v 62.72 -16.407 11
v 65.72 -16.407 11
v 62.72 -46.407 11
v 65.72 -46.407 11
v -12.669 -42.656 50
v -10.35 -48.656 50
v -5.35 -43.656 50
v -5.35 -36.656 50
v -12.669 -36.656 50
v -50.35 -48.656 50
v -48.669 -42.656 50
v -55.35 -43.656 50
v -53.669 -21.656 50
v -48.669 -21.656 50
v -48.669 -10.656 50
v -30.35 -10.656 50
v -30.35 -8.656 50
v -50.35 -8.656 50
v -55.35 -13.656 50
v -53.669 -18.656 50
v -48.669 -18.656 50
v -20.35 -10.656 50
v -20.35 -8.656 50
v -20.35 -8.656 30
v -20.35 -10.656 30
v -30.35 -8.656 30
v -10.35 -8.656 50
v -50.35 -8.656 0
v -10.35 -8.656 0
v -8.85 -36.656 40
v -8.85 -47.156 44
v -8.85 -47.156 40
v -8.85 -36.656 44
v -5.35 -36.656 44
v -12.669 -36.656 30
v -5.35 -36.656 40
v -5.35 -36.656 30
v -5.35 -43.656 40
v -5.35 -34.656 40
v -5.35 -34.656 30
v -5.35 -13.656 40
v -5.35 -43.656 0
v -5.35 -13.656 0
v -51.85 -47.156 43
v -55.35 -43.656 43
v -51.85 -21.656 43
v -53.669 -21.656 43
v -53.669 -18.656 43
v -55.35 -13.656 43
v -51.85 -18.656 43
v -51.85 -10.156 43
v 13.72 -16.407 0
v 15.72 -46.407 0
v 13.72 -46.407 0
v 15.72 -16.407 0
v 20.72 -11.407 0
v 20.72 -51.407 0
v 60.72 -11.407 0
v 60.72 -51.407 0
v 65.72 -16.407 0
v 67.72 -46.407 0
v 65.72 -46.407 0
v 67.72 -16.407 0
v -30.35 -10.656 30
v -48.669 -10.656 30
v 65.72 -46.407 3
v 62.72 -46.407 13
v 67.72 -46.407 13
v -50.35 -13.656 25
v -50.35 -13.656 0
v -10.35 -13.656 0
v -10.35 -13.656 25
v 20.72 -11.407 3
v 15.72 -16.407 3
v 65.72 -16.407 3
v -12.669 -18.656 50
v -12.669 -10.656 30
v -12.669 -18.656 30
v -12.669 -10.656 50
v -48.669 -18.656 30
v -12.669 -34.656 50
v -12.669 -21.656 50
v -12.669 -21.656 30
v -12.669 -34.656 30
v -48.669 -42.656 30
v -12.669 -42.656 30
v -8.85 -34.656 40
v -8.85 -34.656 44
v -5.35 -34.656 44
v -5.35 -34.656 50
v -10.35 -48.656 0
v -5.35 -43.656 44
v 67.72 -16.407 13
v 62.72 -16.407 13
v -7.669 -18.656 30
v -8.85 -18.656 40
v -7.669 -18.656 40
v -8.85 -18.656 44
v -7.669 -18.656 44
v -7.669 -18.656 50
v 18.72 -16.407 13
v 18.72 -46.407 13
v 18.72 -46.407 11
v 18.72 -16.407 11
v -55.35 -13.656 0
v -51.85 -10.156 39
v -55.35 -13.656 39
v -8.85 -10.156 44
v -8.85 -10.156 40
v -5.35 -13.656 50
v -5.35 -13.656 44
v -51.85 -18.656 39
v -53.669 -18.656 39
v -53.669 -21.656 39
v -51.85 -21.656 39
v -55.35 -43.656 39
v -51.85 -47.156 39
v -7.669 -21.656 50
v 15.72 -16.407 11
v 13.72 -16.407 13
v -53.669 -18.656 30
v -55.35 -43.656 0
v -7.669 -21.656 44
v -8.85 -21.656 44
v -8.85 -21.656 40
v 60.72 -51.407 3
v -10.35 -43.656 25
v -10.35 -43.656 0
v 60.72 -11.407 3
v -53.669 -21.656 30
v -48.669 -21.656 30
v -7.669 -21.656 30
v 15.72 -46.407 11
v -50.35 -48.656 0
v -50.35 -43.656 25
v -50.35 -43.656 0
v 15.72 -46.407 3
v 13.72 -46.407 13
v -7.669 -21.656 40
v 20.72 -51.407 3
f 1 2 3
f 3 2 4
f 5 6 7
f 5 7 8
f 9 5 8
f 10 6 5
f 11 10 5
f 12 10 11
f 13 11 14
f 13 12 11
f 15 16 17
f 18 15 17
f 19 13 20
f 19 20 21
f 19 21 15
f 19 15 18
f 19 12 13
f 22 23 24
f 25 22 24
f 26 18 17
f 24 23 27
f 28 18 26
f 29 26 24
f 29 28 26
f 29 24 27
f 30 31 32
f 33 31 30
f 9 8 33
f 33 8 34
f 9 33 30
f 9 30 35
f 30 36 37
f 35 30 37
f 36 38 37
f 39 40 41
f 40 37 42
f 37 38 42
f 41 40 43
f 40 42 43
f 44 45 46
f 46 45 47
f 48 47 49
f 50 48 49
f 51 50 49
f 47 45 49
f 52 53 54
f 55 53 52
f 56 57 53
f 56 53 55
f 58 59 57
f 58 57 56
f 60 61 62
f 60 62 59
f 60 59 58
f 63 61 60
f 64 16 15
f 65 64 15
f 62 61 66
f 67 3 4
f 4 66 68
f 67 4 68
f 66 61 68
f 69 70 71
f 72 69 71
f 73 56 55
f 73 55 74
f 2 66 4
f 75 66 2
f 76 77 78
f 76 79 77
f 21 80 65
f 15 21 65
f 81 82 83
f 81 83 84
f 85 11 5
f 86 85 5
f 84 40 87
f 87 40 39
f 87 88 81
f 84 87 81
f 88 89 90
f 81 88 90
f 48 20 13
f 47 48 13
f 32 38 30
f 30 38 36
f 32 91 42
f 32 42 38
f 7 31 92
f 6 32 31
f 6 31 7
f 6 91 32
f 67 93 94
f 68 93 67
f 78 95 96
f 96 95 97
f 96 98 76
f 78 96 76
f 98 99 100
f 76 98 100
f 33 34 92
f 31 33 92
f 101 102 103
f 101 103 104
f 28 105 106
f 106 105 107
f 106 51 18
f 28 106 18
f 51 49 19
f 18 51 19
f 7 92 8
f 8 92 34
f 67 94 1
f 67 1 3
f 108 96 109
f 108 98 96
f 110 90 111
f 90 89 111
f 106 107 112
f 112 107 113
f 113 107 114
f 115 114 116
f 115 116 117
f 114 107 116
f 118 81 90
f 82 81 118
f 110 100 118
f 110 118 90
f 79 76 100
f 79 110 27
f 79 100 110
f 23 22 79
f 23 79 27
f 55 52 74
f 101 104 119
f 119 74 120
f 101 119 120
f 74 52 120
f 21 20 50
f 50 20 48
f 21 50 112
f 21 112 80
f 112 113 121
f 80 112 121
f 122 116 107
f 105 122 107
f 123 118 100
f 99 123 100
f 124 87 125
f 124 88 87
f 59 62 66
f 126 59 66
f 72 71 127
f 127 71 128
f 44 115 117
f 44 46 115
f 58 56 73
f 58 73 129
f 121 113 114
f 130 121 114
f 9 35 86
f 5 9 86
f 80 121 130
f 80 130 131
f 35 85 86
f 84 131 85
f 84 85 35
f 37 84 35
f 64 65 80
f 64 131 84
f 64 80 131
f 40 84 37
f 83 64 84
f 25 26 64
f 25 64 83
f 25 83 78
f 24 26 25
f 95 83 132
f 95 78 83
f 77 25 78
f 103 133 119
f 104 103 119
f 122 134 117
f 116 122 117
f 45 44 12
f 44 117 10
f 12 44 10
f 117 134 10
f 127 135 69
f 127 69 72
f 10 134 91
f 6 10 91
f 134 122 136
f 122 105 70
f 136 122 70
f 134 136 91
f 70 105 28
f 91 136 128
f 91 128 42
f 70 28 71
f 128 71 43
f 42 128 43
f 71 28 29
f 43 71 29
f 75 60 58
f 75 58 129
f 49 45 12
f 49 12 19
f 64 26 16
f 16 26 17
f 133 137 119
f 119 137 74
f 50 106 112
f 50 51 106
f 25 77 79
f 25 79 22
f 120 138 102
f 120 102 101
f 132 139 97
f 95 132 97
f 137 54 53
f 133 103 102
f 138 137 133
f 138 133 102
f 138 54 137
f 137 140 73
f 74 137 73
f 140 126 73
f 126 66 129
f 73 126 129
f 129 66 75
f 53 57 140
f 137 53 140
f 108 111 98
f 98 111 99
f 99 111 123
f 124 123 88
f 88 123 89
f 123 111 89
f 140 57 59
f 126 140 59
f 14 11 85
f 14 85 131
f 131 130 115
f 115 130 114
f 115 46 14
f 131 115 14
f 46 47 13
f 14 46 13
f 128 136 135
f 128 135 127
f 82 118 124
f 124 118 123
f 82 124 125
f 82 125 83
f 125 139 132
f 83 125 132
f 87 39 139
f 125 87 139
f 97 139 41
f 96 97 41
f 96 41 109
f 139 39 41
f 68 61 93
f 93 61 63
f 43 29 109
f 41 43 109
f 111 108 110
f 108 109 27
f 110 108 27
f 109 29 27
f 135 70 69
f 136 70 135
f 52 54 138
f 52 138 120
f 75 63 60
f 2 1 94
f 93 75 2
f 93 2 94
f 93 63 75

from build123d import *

# Parameters (mm, degrees)
F0_W      = 50
F0_H      = 40
F1_DEPTH  = 50
F3_DEPTH  = 20
F4_W      = 21
F4_H      = 10
F4_W_2    = 8
F5_DEPTH  = 3
F6_W      = 21
F6_H      = 10
F6_W_2    = 8
F7_DEPTH  = 3
F8_DEPTH  = 2
F9_DEPTH  = 2
F10_W     = 10
F10_H     = 11.0885438323
F10_H_2   = 8.9114561677
F11_DEPTH = 5
F12_W     = 2
F12_H     = 4.3249979615
F12_H_2   = 15.6750020385
F13_DEPTH = 10
F14_W     = 40
F14_H     = 30
F15_DEPTH = 25
F16_W     = 50
F16_H     = 40
F17_DEPTH = 3
F18_SIZE  = 5
F19_DEPTH = 2
F20_DEPTH = 2
F21_W     = 2
F21_H     = 30
F22_DEPTH = 10
F23_W     = 30
F23_H     = 2
F24_DEPTH = 3
F25_W     = 30
F25_H     = 2
F26_DEPTH = 3
F27_W     = 35.6263015419
F27_H     = 4
F27_W_2   = 4.3736984581
F28_DEPTH = 3.5
F29_W     = 4.6646985784
F29_H     = 4
F29_W_2   = 35.3353014216
F30_DEPTH = 3.5
F31_SIZE  = 5


with BuildPart() as f1:
    # F0 (on Top) → F1 (new body)
    with BuildSketch(Plane.XY):
        with Locations((-30.3502824157, -28.6558489501)):
            Rectangle(F0_W, F0_H)
    extrude(amount=F1_DEPTH)

    # F2 (on face) → F3 (cut)
    with BuildSketch(Plane.XY.offset(50)):
        Polygon((-51.6693927348, -42.6558489501), (-40.0050915778, -42.6558489501), (-9.6693927348, -42.6558489501), (-9.6693927348, -10.6558489501), (-51.6693927348, -10.6558489501), (-51.6693927348, -40.7105982304), align=None)
    extrude(amount=-F3_DEPTH, mode=Mode.SUBTRACT)

    # F4 (on face) → F5 (join)
    with BuildSketch(Plane(origin=(-9.6693927348, 0, 0), x_dir=(0, -1, 0), z_dir=(-1, 0, 0))):
        with Locations((32.1558489501, 35)):
            Rectangle(F4_W, F4_H)
        with Locations((14.6558489501, 35)):
            Rectangle(F4_W_2, F4_H)
        with Locations((14.6558489501, 45)):
            Rectangle(F4_W_2, F4_H)
        with Locations((32.1558489501, 45)):
            Rectangle(F4_W, F4_H)
    extrude(amount=F5_DEPTH)

    # F6 (on face) → F7 (join)
    with BuildSketch(Plane.YZ.offset(-51.6693927348)):
        with Locations((-32.1558489501, 45)):
            Rectangle(F6_W, F6_H)
        with Locations((-14.6558489501, 45)):
            Rectangle(F6_W_2, F6_H)
        with Locations((-14.6558489501, 35)):
            Rectangle(F6_W_2, F6_H)
        with Locations((-32.1558489501, 35)):
            Rectangle(F6_W, F6_H)
    extrude(amount=F7_DEPTH)

    # F8 (cut): a face of the model
    f8_faces = [f1.faces().sort_by_distance(p)[0] for p in [
        (-9.6693927348, -20.1558489501, 40),
    ]]
    extrude(f8_faces, amount=-F8_DEPTH, mode=Mode.SUBTRACT)

    # F9 (cut): a face of the model
    f9_faces = [f1.faces().sort_by_distance(p)[0] for p in [
        (-51.6693927348, -20.1558489501, 40),
    ]]
    extrude(f9_faces, amount=-F9_DEPTH, mode=Mode.SUBTRACT)

    # F10 (on face) → F11 (cut)
    with BuildSketch(Plane(origin=(0, -8.6558489501, 0), x_dir=(-1, 0, 0), z_dir=(0, 1, 0))):
        with Locations((25.3502824157, 35.5442719162)):
            Rectangle(F10_W, F10_H)
        with Locations((25.3502824157, 45.5442719162)):
            Rectangle(F10_W, F10_H_2)
    extrude(amount=-F11_DEPTH, mode=Mode.SUBTRACT)

    # F12 (on face) → F13 (cut)
    with BuildSketch(Plane.YZ.offset(-5.3502824157)):
        with Locations((-35.6558489501, 47.8375010192)):
            Rectangle(F12_W, F12_H)
        with Locations((-35.6558489501, 37.8375010192)):
            Rectangle(F12_W, F12_H_2)
    extrude(amount=-F13_DEPTH, mode=Mode.SUBTRACT)

    # F14 (on face) → F15 (cut)
    with BuildSketch(Plane(origin=(0, 0, 0), x_dir=(1, 0, 0), z_dir=(0, 0, -1))):
        with Locations((-30.3502824157, 28.6558489501)):
            Rectangle(F14_W, F14_H)
    extrude(amount=-F15_DEPTH, mode=Mode.SUBTRACT)

    # F27 (on face) → F28 (cut)
    with BuildSketch(Plane(origin=(-55.3502824157, 0, 0), x_dir=(0, -1, 0), z_dir=(-1, 0, 0))):
        with Locations((30.8426981792, 41)):
            Rectangle(F27_W, F27_H)
        with Locations((10.8426981792, 41)):
            Rectangle(F27_W_2, F27_H)
    extrude(amount=-F28_DEPTH, mode=Mode.SUBTRACT)

    # F29 (on face) → F30 (cut)
    with BuildSketch(Plane.YZ.offset(-5.3502824157)):
        with Locations((-10.9881982394, 42)):
            Rectangle(F29_W, F29_H)
        with Locations((-30.9881982394, 42)):
            Rectangle(F29_W_2, F29_H)
    extrude(amount=-F30_DEPTH, mode=Mode.SUBTRACT)

    # F31
    f31_edges = [f1.edges().sort_by_distance(p)[0] for p in [
        (-5.350282, -8.655849, 20),
        (-5.350282, -48.655849, 20),
        (-55.350282, -8.655849, 19.5),
        (-55.350282, -48.655849, 19.5),
    ]]
    chamfer(f31_edges, length=F31_SIZE)


with BuildPart() as f17:
    # F16 (on Top) → F17 (new body)
    with BuildSketch(Plane.XY):
        with Locations((40.7204538584, -31.4069162309)):
            Rectangle(F16_W, F16_H)
    extrude(amount=F17_DEPTH)

    # F18
    f18_edges = [f17.edges().sort_by_distance(p)[0] for p in [
        (65.720454, -11.406916, 1.5),
        (65.720454, -51.406916, 1.5),
        (15.720454, -51.406916, 1.5),
        (15.720454, -11.406916, 1.5),
    ]]
    chamfer(f18_edges, length=F18_SIZE)

    # F19 (add): faces of the model
    f19_faces = [f17.faces().sort_by_distance(p)[0] for p in [
        (65.7204538584, -31.4069162309, 1.5),
        (15.7204538584, -31.4069162309, 1.5),
    ]]
    extrude(f19_faces, amount=F19_DEPTH, dir=(1, 0, 0))

    # F20 (add): a face of the model
    f20_faces = [f17.faces().sort_by_distance(p)[0] for p in [
        (15.7204538584, -31.4069162309, 1.5),
    ]]
    extrude(f20_faces, amount=F20_DEPTH)

    # F21 (on face) → F22 (join)
    with BuildSketch(Plane.XY.offset(3)):
        with Locations((66.7204538584, -31.4069162309)):
            Rectangle(F21_W, F21_H)
        with Locations((14.7204538584, -31.4069162309)):
            Rectangle(F21_W, F21_H)
    extrude(amount=F22_DEPTH)

    # F23 (on face) → F24 (join)
    with BuildSketch(Plane(origin=(65.7204538584, 0, 0), x_dir=(0, -1, 0), z_dir=(-1, 0, 0))):
        with Locations((31.4069162309, 12)):
            Rectangle(F23_W, F23_H)
    extrude(amount=F24_DEPTH)

    # F25 (on face) → F26 (join)
    with BuildSketch(Plane.YZ.offset(15.7204538584)):
        with Locations((-31.4069162309, 12)):
            Rectangle(F25_W, F25_H)
    extrude(amount=F26_DEPTH)


solid = Compound([f1.part, f17.part])
